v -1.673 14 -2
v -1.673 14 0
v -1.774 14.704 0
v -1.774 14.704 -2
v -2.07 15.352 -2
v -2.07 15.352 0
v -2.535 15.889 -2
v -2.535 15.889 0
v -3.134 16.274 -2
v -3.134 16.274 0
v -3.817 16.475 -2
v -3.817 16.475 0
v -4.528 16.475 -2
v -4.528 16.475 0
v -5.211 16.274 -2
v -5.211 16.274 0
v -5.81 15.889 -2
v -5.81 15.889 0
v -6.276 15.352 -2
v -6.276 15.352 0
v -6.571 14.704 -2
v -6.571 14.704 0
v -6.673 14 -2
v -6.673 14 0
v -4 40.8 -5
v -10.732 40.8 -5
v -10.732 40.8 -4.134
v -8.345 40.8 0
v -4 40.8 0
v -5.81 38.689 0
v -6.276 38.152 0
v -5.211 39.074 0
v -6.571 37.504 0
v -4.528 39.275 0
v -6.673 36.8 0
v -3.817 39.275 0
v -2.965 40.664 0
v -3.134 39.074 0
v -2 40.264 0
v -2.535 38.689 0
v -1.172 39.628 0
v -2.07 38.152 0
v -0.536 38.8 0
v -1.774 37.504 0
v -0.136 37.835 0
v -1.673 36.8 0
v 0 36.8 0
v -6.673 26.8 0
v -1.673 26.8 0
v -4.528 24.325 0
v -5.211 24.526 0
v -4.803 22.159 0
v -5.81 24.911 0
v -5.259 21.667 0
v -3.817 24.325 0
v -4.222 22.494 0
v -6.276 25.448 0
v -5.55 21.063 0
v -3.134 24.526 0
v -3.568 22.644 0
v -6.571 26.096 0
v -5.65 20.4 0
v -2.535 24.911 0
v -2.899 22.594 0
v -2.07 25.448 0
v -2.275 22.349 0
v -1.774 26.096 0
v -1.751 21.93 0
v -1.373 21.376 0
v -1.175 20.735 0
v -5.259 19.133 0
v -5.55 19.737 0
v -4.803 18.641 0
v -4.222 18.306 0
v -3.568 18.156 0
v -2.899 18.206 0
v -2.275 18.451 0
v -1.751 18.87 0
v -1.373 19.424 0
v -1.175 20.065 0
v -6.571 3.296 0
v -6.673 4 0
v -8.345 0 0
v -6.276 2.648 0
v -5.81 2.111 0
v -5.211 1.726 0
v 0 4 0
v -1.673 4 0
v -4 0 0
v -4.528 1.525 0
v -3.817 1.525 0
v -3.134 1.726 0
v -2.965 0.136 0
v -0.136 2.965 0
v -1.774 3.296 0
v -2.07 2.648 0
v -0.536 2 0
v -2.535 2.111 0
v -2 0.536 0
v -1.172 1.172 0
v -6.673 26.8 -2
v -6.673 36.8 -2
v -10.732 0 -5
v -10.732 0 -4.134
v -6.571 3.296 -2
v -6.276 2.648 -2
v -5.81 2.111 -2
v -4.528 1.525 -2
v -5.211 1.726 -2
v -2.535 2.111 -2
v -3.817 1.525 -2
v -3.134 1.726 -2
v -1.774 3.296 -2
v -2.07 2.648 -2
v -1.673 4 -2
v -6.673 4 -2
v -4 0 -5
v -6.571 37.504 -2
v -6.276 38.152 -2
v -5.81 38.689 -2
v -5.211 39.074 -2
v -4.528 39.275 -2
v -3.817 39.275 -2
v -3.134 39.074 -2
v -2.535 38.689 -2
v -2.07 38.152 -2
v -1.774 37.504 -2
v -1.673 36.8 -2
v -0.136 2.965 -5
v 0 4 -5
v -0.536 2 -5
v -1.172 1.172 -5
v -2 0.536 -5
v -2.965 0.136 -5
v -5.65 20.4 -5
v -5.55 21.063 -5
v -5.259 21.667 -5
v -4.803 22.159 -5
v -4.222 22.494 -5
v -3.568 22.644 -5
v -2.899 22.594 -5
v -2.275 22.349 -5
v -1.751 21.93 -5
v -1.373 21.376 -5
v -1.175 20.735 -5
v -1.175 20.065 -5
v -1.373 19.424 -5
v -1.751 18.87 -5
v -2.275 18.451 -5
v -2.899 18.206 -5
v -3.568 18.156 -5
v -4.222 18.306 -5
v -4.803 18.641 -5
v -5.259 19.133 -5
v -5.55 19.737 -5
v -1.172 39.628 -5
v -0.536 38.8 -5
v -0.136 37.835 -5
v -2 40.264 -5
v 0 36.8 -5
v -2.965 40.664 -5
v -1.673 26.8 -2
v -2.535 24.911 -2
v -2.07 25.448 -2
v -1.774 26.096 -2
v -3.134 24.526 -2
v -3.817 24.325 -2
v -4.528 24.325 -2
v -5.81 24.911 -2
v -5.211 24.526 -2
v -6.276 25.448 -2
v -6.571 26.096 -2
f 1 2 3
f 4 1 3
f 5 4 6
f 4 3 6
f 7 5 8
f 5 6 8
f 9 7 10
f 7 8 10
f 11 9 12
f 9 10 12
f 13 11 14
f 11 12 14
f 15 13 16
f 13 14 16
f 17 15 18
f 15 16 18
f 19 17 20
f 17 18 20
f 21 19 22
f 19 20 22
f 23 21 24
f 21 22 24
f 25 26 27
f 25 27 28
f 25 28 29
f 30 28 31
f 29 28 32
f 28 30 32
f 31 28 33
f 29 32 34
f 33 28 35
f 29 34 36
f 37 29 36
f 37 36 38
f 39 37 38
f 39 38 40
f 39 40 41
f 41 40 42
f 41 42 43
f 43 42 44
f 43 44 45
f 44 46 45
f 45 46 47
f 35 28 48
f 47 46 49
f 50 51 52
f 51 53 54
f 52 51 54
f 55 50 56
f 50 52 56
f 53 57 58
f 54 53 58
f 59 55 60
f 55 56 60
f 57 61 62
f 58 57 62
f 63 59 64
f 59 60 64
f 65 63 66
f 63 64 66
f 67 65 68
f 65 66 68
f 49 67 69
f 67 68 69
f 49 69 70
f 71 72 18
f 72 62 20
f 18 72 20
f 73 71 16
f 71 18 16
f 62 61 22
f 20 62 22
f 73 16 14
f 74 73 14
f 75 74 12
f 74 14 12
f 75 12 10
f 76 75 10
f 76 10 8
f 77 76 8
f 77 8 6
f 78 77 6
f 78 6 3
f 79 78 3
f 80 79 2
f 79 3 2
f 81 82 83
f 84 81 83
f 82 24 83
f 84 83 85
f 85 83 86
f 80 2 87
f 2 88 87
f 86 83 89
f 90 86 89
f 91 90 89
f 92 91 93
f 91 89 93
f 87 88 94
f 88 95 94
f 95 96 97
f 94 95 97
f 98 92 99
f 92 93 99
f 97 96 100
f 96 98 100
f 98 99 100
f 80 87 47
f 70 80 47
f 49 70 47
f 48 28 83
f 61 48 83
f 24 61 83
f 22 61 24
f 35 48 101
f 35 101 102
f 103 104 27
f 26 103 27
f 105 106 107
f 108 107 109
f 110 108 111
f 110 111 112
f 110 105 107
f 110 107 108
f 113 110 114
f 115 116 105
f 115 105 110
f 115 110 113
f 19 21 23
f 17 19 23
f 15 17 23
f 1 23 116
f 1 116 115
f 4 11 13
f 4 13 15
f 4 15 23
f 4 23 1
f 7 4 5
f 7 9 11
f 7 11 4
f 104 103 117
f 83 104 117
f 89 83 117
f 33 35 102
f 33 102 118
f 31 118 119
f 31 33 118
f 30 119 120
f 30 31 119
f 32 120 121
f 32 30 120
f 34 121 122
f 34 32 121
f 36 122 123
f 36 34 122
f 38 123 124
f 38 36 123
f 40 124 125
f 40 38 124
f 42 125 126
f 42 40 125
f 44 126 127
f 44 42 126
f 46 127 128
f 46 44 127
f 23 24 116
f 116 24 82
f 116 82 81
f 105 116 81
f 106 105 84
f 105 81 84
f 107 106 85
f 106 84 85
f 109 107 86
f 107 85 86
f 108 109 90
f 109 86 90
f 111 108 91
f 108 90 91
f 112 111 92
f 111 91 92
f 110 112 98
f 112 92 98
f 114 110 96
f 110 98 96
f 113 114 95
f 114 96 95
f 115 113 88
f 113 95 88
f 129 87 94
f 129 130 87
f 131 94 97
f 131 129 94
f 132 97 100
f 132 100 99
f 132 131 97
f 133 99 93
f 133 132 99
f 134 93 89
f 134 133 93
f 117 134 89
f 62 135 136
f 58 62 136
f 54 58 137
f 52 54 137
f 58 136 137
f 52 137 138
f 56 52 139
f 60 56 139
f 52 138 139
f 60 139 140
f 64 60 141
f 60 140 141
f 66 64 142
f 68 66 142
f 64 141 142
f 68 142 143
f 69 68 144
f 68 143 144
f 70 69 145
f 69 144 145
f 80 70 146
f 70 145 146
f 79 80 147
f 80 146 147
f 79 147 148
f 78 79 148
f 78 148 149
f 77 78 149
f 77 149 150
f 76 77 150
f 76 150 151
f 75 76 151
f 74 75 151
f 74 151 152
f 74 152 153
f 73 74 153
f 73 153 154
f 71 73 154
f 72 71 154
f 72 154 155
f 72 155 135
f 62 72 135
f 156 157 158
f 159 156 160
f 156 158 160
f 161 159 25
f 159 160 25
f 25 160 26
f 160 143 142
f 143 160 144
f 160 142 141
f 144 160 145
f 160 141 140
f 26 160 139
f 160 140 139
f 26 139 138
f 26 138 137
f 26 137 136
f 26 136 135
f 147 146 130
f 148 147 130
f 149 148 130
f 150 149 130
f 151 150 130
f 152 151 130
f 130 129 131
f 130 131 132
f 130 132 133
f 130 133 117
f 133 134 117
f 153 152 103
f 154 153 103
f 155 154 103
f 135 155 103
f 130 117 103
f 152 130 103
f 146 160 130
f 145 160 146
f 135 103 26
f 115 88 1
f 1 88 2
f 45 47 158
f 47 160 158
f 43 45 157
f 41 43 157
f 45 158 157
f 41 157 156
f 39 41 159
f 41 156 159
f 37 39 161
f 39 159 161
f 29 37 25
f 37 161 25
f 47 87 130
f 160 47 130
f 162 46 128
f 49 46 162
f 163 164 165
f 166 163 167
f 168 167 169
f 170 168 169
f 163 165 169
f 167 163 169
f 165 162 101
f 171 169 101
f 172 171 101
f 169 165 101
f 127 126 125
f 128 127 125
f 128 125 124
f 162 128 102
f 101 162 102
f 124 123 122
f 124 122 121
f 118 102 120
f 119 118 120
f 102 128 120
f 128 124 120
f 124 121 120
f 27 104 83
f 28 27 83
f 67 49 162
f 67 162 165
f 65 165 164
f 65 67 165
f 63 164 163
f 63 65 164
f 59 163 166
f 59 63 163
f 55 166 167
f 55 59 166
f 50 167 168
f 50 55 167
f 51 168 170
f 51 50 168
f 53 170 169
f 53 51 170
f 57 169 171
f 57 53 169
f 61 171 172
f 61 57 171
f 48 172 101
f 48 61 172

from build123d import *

# Parameters (mm, degrees)
EXTRUDE_1_DEPTH     = 40.8
FILLET_1_R          = 4
CUT_EXTRUDE_1_DEPTH = 2
HOLE_WIZARD_M41_D   = 4.5
CHAMFER_1_SIZE      = 0.5
CHAMFER_1_SIZE2     = 1


with BuildPart() as part:
    # Эскиз1 → Бобышка-Вытянуть1 (new body)
    with BuildSketch(Plane(origin=(0, 0, 0), x_dir=(1, 0, 0), z_dir=(0, 1, 0))):
        Polygon((0, 0), (0, 5), (-11.232050808, 5), (-8.345299462, 0), align=None)
    extrude(amount=EXTRUDE_1_DEPTH)

    # Скругление1
    fillet_1_edges = [part.edges().sort_by_distance(p)[0] for p in [
        (0, 0, -2.5),
        (0, 40.8, -2.5),
    ]]
    fillet(fillet_1_edges, radius=FILLET_1_R)

    # Эскиз4 → Вырез-Вытянуть1 (cut)
    with BuildSketch(Plane.XY):
        with BuildLine():
            Line((-1.672649731, 36.8), (-1.672649731, 26.8))
            ThreePointArc((-1.672649731, 26.8), (-4.172649731, 24.3), (-6.672649731, 26.8))
            Line((-6.672649731, 26.8), (-6.672649731, 36.8))
            ThreePointArc((-6.672649731, 36.8), (-4.172649731, 39.3), (-1.672649731, 36.8))
        make_face()
        with BuildLine():
            Line((-1.672649731, 4), (-1.672649731, 14))
            ThreePointArc((-1.672649731, 14), (-4.172649731, 16.5), (-6.672649731, 14))
            Line((-6.672649731, 14), (-6.672649731, 4))
            ThreePointArc((-6.672649731, 4), (-4.172649731, 1.5), (-1.672649731, 4))
        make_face()
    extrude(amount=-CUT_EXTRUDE_1_DEPTH, mode=Mode.SUBTRACT)

    # Отверстие с зазором M41 (through all)
    with Locations(Plane.XY):
        with Locations((-3.4, 20.4)):
            Hole(HOLE_WIZARD_M41_D / 2)

    # Фаска1
    chamfer_1_edges = [part.edges().sort_by_distance(p)[0] for p in [
        (-11.232050808, 20.4, -5),
    ]]
    chamfer_1_side = [part.faces().sort_by_distance(p)[0] for p in [
        (-5.771423716, 20.4, -5),
    ]]
    chamfer(chamfer_1_edges, length=CHAMFER_1_SIZE, length2=CHAMFER_1_SIZE2, reference=chamfer_1_side[0])


solid = part.part
